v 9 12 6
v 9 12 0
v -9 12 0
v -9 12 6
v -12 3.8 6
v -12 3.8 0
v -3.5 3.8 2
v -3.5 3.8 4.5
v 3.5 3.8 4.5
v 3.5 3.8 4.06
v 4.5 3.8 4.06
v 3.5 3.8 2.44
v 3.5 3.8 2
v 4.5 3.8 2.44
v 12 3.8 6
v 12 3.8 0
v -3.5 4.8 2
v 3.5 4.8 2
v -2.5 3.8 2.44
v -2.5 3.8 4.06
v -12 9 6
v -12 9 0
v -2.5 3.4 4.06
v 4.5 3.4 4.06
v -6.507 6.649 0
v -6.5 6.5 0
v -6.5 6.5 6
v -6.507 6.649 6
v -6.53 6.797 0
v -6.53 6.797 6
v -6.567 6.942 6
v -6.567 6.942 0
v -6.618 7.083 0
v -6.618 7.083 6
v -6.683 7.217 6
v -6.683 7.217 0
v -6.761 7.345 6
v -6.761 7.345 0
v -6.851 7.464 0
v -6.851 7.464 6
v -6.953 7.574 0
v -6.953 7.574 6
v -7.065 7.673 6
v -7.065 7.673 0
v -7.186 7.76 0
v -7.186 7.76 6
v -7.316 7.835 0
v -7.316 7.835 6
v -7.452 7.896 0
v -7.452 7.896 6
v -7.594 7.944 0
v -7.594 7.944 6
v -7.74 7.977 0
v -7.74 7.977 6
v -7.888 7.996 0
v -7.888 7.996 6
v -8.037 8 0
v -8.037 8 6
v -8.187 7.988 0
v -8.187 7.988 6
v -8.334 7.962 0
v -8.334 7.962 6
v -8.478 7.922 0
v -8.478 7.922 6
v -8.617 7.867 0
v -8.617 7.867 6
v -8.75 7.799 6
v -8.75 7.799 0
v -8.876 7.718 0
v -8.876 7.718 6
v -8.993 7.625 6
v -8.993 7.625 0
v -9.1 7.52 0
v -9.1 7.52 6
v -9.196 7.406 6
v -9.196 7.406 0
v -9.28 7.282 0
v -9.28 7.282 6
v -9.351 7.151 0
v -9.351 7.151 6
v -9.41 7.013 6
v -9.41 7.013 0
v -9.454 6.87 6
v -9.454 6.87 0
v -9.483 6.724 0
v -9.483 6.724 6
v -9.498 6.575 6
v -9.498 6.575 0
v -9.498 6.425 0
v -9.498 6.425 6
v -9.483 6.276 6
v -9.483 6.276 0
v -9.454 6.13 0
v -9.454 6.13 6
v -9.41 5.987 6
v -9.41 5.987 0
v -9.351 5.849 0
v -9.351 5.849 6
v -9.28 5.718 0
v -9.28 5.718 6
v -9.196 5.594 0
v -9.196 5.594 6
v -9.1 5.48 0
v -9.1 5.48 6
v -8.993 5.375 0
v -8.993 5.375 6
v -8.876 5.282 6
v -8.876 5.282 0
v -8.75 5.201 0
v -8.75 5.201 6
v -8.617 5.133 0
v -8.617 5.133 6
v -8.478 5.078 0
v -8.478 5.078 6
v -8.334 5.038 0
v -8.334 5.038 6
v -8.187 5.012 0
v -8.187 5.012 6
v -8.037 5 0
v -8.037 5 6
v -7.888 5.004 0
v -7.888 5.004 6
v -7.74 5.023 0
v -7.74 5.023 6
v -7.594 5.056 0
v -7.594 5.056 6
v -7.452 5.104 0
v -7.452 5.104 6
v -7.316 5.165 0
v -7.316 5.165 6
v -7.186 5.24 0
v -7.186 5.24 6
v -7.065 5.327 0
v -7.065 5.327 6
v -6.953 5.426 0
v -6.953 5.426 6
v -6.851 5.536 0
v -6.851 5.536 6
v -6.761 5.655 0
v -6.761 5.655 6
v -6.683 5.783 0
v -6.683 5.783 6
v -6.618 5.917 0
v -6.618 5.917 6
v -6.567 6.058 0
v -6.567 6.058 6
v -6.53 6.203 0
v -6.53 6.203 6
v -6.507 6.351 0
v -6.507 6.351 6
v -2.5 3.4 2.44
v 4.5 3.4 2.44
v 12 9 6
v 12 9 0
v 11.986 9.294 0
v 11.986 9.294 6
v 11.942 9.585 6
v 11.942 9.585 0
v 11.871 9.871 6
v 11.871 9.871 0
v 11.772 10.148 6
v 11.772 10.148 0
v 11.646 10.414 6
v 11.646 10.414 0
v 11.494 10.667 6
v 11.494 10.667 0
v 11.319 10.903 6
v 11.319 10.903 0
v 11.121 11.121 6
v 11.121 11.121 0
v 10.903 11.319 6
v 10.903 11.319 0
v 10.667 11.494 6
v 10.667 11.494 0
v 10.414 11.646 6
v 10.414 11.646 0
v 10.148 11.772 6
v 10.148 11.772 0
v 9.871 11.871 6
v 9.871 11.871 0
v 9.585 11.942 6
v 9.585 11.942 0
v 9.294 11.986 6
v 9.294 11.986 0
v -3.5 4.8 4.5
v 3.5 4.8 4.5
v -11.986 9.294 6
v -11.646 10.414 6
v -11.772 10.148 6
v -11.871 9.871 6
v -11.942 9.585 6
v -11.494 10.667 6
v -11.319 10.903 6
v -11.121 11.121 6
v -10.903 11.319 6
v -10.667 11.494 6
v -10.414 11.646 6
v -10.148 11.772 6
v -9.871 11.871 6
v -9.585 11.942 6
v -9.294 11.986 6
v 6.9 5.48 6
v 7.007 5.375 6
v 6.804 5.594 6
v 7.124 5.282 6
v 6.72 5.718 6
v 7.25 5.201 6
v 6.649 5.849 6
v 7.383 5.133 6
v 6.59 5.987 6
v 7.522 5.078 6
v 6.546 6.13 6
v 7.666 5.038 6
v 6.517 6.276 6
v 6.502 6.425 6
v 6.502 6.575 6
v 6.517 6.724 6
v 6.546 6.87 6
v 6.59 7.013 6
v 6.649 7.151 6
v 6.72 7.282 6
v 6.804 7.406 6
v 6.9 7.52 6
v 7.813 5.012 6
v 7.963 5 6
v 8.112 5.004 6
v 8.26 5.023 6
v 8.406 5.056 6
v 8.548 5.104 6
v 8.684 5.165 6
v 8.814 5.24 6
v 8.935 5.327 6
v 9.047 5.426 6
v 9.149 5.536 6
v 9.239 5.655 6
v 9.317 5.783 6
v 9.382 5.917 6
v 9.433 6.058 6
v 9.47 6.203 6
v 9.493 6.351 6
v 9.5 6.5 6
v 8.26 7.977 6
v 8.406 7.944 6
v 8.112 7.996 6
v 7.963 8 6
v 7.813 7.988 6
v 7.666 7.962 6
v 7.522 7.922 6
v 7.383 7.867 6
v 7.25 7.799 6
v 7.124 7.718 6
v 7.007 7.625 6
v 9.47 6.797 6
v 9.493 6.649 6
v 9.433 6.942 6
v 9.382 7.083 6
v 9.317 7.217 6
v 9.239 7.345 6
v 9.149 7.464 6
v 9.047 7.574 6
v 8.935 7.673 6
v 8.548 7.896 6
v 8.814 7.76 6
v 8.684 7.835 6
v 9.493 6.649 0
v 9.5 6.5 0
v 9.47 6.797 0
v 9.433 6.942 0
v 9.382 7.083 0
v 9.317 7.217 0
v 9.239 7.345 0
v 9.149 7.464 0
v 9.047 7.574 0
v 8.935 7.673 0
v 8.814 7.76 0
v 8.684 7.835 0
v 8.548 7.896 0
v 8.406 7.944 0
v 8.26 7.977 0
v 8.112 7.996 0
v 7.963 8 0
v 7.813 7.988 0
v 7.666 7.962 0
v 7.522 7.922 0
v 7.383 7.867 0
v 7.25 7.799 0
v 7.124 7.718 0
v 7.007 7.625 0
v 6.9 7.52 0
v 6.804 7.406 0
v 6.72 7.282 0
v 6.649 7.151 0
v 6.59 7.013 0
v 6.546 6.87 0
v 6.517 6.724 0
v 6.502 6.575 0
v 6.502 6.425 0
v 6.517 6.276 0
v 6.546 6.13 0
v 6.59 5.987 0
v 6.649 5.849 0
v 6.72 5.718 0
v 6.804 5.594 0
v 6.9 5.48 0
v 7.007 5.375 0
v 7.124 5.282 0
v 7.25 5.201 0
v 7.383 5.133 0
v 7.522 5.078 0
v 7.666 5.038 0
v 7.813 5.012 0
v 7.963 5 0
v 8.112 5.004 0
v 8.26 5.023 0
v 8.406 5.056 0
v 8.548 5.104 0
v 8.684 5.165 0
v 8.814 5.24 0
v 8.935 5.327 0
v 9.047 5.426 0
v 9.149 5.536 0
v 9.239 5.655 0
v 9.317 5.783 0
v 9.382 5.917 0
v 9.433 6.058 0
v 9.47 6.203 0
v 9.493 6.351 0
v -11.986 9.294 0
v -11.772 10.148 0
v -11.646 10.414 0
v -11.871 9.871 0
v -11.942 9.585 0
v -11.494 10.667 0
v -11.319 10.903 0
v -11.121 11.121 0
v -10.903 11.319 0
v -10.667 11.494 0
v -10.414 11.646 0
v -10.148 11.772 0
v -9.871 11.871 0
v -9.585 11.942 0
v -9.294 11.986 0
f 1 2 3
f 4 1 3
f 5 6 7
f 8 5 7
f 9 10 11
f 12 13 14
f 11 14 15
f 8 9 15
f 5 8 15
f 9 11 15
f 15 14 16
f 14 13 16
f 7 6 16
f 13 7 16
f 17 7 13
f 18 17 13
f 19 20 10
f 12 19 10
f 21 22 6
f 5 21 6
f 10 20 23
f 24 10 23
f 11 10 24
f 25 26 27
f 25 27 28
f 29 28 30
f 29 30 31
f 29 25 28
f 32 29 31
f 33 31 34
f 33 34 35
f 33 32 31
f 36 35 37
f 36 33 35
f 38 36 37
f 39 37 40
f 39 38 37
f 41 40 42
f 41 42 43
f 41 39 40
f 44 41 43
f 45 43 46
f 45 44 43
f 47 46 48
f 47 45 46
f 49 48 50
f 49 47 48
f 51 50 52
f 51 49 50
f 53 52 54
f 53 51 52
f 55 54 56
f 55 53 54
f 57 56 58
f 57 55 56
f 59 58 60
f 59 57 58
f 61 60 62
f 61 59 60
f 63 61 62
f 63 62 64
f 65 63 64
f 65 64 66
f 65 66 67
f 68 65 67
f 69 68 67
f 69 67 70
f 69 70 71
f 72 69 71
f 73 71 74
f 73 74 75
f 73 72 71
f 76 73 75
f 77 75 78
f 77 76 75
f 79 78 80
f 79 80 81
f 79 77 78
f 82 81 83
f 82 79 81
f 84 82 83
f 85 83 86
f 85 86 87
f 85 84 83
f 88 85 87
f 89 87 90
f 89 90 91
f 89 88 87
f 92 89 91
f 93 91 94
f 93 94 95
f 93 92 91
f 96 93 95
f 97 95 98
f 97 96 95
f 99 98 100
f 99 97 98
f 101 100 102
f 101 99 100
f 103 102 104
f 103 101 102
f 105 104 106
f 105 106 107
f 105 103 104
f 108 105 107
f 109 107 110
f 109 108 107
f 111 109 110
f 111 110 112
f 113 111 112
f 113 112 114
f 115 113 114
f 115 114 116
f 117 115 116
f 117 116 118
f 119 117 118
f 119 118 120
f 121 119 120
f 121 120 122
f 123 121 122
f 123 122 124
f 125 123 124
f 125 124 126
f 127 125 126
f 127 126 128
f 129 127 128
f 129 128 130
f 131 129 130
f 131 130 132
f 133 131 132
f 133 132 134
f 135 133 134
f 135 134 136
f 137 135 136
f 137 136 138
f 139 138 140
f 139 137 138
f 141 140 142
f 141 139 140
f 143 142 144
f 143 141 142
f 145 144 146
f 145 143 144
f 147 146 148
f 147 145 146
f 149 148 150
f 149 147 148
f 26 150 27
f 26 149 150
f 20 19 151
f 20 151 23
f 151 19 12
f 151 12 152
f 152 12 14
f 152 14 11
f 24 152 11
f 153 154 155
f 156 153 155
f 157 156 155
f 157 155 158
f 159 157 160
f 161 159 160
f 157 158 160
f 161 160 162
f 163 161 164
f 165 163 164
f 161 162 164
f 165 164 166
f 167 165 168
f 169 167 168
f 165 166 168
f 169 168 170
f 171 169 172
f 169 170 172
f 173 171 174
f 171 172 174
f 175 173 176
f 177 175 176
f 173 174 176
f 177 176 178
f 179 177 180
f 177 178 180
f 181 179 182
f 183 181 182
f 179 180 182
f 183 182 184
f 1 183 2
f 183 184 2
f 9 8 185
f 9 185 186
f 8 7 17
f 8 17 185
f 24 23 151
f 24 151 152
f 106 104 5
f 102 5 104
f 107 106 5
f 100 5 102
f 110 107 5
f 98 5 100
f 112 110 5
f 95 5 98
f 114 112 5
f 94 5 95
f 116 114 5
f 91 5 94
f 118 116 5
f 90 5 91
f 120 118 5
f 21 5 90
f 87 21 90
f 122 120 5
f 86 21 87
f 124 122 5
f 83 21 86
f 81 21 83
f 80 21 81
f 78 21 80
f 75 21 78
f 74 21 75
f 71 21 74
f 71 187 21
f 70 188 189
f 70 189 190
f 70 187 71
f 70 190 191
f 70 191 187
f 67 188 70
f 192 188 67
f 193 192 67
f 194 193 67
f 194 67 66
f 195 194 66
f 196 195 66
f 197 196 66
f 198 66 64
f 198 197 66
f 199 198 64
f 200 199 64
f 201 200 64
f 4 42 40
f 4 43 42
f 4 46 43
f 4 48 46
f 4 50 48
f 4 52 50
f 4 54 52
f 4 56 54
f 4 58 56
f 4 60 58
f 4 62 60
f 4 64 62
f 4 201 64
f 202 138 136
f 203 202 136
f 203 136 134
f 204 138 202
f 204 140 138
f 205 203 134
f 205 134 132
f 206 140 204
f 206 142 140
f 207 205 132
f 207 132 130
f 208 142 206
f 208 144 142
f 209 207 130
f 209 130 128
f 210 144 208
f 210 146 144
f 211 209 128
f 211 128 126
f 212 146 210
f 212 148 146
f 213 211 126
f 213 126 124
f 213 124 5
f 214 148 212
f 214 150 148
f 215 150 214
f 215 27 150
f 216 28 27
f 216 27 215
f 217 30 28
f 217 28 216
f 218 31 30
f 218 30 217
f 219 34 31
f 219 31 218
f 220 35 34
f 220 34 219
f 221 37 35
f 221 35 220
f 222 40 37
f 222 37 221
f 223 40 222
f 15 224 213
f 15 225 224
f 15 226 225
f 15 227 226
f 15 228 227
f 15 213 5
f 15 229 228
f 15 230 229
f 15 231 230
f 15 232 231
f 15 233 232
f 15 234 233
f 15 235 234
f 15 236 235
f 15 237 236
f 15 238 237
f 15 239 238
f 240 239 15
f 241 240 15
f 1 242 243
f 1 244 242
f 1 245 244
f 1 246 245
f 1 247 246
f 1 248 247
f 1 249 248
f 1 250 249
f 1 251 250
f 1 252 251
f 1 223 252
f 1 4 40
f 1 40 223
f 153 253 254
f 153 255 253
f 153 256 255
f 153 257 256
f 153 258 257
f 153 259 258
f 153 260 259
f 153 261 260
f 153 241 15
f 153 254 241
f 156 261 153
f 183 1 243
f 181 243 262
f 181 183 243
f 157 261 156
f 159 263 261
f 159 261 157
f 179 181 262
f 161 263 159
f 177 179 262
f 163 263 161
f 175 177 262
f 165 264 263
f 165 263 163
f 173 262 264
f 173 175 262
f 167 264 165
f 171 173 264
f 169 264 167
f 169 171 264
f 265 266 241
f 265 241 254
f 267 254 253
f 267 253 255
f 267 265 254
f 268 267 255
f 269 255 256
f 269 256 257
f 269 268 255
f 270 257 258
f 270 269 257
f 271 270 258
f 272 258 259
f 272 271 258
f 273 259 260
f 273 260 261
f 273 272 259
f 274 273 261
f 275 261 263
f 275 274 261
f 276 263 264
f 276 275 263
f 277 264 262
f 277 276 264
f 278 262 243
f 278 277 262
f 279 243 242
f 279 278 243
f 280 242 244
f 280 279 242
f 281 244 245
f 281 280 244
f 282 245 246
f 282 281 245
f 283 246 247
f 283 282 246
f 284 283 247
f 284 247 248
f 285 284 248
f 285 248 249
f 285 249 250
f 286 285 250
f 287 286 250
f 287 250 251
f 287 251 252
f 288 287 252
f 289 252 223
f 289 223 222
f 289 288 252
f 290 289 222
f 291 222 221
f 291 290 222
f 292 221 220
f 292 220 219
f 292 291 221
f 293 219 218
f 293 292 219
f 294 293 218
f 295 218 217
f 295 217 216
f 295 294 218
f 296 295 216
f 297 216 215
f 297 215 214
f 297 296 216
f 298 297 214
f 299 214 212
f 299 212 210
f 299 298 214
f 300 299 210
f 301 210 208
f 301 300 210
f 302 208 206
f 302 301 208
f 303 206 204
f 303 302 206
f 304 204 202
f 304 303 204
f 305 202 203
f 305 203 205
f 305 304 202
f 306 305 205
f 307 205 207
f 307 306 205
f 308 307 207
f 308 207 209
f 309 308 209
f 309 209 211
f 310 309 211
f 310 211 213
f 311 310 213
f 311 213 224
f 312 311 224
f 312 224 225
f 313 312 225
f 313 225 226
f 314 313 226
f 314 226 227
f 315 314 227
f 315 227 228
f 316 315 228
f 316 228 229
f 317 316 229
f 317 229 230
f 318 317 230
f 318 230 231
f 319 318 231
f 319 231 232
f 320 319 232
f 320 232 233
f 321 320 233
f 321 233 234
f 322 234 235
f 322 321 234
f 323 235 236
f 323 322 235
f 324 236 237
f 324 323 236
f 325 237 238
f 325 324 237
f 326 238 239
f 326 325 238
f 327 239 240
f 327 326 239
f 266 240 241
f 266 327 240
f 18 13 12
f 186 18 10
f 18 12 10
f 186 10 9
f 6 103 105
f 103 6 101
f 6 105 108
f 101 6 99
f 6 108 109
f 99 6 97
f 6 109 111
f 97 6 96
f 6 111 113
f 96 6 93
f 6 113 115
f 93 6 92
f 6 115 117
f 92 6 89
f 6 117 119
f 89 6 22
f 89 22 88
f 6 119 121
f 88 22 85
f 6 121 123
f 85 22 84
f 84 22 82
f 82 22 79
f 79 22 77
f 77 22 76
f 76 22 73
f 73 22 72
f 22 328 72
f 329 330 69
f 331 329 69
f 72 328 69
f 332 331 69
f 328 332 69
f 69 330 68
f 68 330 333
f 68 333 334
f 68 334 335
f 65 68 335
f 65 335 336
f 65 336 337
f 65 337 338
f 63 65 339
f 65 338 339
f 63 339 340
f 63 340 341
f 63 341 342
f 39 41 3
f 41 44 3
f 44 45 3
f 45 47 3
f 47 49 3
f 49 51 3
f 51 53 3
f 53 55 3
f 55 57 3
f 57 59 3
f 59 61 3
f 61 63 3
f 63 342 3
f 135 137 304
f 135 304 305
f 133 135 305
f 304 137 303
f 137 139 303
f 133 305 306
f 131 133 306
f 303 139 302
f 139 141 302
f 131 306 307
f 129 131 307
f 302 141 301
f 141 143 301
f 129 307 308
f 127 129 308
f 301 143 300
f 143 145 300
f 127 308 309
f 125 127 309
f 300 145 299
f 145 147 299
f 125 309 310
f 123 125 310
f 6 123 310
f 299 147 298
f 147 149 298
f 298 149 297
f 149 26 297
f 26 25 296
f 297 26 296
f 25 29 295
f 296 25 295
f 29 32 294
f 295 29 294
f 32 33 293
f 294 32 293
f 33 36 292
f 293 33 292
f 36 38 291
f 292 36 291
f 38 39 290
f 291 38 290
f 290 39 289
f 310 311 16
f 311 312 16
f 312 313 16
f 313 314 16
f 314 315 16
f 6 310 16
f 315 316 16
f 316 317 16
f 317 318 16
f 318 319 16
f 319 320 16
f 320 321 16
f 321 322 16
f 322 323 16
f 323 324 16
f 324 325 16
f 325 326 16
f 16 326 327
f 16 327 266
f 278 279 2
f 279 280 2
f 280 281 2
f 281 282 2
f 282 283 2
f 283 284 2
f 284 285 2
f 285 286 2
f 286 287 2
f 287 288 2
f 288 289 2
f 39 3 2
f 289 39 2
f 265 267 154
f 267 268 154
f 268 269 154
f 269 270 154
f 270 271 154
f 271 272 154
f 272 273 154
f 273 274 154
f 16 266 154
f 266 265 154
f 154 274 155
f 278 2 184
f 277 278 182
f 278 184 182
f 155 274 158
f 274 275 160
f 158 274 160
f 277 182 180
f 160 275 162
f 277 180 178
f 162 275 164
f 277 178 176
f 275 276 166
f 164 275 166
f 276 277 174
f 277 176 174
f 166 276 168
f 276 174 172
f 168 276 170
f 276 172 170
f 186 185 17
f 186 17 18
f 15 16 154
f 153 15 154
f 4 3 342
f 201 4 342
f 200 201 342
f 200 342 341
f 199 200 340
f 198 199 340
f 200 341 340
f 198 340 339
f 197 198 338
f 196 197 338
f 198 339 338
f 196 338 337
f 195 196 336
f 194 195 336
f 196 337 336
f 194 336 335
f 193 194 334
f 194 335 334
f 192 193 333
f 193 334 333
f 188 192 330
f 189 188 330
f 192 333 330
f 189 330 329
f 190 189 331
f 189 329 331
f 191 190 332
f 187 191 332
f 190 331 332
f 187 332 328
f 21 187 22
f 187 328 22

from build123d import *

# Parameters (mm, degrees)
SKETCH003_R     = 1.5
PAD002_DEPTH    = 6
SKETCH004_W     = 7
SKETCH004_H     = 2.5
POCKET001_DEPTH = 1
SKETCH005_W     = 7
SKETCH005_H     = 1.62
PAD003_DEPTH    = 0.4


with BuildPart() as part:
    # Sketch003 → Pad002 (new body)
    with BuildSketch(Plane.XY):
        with BuildLine():
            Line((-12, 3.8), (12, 3.8))
            Line((12, 3.8), (12, 9))
            ThreePointArc((12, 9), (11.12132, 11.12132), (9, 12))
            Line((9, 12), (-9, 12))
            ThreePointArc((-9, 12), (-11.12132, 11.12132), (-12, 9))
            Line((-12, 9), (-12, 3.8))
        make_face()
        with Locations((-8, 6.5)):
            Circle(SKETCH003_R, mode=Mode.SUBTRACT)
        with Locations((8, 6.5)):
            Circle(SKETCH003_R, mode=Mode.SUBTRACT)
    extrude(amount=PAD002_DEPTH)

    # Sketch004 (on Face1 of Pad002) → Pocket001 (cut)
    with BuildSketch(Plane.XZ.offset(-3.8)):
        with Locations((0, 3.25)):
            Rectangle(SKETCH004_W, SKETCH004_H)
    extrude(amount=-POCKET001_DEPTH, mode=Mode.SUBTRACT)

    # Sketch005 (on Face1 of Pocket001) → Pad003 (join)
    with BuildSketch(Plane.XZ.offset(-3.8)):
        with Locations((1, 3.25)):
            Rectangle(SKETCH005_W, SKETCH005_H)
    extrude(amount=PAD003_DEPTH)


solid = part.part
